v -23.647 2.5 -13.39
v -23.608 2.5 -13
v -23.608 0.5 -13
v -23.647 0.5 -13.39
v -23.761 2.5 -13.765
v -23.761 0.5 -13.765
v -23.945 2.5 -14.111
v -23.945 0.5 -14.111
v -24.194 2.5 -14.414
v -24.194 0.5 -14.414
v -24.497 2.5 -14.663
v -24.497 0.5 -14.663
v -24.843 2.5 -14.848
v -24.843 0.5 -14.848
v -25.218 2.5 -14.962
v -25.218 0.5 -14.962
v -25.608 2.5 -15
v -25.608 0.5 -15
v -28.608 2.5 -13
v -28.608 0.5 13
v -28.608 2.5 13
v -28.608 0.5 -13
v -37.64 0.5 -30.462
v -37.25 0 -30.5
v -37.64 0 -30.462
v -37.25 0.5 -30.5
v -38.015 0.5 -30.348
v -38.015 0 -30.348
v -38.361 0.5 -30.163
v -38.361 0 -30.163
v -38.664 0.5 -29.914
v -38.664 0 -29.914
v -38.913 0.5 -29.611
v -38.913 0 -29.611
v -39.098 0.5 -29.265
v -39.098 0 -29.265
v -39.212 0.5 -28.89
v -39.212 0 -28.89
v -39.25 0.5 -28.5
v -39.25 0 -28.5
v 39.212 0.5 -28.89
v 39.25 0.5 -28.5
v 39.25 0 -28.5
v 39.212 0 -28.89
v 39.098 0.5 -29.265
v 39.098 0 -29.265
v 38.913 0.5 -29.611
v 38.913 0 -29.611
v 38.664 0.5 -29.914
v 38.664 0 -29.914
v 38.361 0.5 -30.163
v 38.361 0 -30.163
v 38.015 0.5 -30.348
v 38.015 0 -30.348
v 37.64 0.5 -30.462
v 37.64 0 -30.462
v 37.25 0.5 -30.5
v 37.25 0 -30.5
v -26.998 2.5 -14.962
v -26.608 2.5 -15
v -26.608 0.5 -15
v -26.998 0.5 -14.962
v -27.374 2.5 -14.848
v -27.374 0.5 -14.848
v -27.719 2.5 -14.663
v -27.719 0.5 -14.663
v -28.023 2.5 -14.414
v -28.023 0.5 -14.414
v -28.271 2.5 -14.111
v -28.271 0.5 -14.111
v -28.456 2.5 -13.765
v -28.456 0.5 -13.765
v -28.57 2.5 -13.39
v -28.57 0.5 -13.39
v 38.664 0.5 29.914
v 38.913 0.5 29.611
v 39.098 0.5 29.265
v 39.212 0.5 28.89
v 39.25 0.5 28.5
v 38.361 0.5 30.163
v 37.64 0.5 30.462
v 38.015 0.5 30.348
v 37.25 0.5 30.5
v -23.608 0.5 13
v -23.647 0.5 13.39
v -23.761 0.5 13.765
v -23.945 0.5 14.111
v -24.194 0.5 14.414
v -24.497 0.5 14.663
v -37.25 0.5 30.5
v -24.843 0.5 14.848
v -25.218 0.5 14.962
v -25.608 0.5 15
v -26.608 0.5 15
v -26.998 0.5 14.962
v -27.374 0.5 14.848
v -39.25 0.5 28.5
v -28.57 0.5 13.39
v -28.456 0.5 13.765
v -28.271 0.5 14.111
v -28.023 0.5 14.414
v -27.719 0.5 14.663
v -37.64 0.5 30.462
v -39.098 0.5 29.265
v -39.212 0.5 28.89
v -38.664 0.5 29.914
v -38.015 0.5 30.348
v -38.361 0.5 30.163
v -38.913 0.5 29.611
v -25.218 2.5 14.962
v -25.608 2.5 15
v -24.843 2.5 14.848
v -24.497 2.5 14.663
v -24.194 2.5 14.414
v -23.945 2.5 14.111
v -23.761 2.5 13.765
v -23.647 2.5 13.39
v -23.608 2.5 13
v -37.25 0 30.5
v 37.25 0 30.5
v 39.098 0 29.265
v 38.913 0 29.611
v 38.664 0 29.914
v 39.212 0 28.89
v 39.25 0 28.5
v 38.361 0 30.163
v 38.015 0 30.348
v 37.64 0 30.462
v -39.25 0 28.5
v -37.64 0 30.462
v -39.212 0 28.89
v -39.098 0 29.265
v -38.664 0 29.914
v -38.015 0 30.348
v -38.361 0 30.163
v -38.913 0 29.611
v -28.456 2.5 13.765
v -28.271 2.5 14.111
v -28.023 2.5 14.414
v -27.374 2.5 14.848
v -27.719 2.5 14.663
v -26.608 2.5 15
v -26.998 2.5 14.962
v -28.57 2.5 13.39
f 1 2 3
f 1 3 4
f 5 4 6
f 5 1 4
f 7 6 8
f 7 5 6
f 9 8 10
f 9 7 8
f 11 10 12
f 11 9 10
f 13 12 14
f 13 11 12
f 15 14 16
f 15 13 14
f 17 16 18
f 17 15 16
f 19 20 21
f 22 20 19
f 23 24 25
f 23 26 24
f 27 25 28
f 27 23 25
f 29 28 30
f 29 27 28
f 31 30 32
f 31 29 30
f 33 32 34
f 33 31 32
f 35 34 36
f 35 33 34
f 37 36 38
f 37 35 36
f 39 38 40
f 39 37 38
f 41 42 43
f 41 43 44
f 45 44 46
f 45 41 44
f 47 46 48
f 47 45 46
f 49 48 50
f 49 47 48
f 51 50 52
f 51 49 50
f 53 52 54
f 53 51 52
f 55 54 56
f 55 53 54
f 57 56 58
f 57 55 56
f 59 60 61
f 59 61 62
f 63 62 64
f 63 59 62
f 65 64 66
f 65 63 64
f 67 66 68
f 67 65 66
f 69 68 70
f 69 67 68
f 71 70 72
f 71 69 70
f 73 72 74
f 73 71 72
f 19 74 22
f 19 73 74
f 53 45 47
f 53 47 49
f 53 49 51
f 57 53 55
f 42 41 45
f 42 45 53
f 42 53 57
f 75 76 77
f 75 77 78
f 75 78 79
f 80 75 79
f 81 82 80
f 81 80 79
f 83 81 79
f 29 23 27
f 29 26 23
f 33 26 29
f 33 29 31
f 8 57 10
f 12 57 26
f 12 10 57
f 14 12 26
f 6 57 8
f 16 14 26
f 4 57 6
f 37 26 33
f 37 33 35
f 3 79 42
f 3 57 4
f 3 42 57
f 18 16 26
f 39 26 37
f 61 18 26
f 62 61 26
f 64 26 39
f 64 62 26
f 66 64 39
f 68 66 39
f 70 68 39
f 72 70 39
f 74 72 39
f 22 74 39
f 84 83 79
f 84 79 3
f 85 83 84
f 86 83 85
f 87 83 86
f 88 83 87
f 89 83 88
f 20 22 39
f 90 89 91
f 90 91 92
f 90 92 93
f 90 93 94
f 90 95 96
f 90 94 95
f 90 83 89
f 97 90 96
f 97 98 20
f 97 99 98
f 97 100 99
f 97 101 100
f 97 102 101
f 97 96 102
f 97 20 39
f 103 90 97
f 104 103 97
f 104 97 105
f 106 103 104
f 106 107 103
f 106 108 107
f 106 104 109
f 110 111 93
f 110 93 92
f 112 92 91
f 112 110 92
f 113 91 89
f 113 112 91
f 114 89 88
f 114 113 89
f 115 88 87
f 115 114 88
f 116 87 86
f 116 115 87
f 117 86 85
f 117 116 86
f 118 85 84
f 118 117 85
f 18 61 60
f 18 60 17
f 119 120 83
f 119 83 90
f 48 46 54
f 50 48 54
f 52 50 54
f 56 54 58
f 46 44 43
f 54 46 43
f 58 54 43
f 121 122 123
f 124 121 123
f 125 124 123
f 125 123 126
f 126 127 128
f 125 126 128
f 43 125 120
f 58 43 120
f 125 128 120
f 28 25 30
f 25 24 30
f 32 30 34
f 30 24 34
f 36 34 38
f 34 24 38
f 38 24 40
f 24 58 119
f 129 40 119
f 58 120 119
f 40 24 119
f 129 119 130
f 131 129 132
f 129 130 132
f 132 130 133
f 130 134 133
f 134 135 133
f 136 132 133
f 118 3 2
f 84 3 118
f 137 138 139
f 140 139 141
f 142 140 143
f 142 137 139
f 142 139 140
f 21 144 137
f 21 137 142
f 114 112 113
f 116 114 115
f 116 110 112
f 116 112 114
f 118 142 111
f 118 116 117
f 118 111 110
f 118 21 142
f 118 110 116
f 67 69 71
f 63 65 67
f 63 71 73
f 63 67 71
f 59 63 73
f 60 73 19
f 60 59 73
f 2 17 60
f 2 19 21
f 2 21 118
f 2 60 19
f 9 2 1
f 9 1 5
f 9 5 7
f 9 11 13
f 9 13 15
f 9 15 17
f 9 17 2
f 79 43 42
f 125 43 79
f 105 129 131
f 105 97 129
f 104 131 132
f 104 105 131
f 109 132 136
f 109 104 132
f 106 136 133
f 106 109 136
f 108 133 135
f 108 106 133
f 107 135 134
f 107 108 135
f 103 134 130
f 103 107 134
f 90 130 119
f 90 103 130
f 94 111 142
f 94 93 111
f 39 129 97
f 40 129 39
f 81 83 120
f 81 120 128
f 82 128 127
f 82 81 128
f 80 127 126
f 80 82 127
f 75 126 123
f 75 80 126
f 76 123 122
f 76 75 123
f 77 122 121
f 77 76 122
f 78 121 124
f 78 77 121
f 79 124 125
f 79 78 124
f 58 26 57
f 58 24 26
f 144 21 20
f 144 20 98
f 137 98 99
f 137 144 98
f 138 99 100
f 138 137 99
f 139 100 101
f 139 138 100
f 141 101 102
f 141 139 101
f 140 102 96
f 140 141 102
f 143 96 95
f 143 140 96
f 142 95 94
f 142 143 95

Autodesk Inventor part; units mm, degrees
ref_plane "YZ Plane" through (0, 0, 0) normal (1, 0, 0) x (0, 1, 0)
ref_plane "XZ Plane" through (0, 0, 0) normal (0, 1, 0) x (-1, 0, 0)
ref_plane "XY Plane" through (0, 0, 0) normal (0, 0, 1) x (1, 0, 0)
sketch "Sketch3" plane through (0, 0, 0) normal (0, 1, 0) x (-1, 0, 0)
  line L0 (-39.25, 30.5) -> (39.25, 30.5)
  line L1 (39.25, 30.5) -> (39.25, -30.5)
  line L2 (39.25, -30.5) -> (-39.25, -30.5)
  line L3 (-39.25, -30.5) -> (-39.25, 30.5)
  line L4 (-39.25, 30.5) -> (39.25, -30.5) construction
  line L5 (39.25, 30.5) -> (-39.25, -30.5) construction
  point P0 (0, 0)
  dimension "d0" = 78.5
  dimension "d1" = 61
extrude "Extrusion1" add sketch "Sketch3" along normal blind 0.5
sketch "Sketch4" plane through (0, 0.5, 0) normal (0, 1, 0) x (1, 0, 0)
  line L0 (-23.6083, -15) -> (-28.6083, -15)
  line L1 (-28.6083, -15) -> (-28.6083, 15)
  line L2 (-28.6083, 15) -> (-23.6083, 15)
  line L3 (-23.6083, 15) -> (-23.6083, -15)
  line L4 (-23.6083, -15) -> (-28.6083, 15) construction
  line L5 (-28.6083, -15) -> (-23.6083, 15) construction
  point P0 (0, 0)
  point P1 (-26.1083, 0)
  dimension "d4" = 5
  dimension "d5" = 30
extrude "Extrusion2" add sketch "Sketch4" along normal blind 2
fillet "Fillet1" radius 2 4 edges at (-28.6083, 1.5, 15) (-23.6083, 1.5, 15) (-28.6083, 1.5, -15) (-23.6083, 1.5, -15)
fillet "Fillet2" radius 2 4 edges at (-39.25, 0.25, 30.5) (39.25, 0.25, 30.5) (39.25, 0.25, -30.5) (-39.25, 0.25, -30.5)
properties part number "Tutup Pzem test1"
